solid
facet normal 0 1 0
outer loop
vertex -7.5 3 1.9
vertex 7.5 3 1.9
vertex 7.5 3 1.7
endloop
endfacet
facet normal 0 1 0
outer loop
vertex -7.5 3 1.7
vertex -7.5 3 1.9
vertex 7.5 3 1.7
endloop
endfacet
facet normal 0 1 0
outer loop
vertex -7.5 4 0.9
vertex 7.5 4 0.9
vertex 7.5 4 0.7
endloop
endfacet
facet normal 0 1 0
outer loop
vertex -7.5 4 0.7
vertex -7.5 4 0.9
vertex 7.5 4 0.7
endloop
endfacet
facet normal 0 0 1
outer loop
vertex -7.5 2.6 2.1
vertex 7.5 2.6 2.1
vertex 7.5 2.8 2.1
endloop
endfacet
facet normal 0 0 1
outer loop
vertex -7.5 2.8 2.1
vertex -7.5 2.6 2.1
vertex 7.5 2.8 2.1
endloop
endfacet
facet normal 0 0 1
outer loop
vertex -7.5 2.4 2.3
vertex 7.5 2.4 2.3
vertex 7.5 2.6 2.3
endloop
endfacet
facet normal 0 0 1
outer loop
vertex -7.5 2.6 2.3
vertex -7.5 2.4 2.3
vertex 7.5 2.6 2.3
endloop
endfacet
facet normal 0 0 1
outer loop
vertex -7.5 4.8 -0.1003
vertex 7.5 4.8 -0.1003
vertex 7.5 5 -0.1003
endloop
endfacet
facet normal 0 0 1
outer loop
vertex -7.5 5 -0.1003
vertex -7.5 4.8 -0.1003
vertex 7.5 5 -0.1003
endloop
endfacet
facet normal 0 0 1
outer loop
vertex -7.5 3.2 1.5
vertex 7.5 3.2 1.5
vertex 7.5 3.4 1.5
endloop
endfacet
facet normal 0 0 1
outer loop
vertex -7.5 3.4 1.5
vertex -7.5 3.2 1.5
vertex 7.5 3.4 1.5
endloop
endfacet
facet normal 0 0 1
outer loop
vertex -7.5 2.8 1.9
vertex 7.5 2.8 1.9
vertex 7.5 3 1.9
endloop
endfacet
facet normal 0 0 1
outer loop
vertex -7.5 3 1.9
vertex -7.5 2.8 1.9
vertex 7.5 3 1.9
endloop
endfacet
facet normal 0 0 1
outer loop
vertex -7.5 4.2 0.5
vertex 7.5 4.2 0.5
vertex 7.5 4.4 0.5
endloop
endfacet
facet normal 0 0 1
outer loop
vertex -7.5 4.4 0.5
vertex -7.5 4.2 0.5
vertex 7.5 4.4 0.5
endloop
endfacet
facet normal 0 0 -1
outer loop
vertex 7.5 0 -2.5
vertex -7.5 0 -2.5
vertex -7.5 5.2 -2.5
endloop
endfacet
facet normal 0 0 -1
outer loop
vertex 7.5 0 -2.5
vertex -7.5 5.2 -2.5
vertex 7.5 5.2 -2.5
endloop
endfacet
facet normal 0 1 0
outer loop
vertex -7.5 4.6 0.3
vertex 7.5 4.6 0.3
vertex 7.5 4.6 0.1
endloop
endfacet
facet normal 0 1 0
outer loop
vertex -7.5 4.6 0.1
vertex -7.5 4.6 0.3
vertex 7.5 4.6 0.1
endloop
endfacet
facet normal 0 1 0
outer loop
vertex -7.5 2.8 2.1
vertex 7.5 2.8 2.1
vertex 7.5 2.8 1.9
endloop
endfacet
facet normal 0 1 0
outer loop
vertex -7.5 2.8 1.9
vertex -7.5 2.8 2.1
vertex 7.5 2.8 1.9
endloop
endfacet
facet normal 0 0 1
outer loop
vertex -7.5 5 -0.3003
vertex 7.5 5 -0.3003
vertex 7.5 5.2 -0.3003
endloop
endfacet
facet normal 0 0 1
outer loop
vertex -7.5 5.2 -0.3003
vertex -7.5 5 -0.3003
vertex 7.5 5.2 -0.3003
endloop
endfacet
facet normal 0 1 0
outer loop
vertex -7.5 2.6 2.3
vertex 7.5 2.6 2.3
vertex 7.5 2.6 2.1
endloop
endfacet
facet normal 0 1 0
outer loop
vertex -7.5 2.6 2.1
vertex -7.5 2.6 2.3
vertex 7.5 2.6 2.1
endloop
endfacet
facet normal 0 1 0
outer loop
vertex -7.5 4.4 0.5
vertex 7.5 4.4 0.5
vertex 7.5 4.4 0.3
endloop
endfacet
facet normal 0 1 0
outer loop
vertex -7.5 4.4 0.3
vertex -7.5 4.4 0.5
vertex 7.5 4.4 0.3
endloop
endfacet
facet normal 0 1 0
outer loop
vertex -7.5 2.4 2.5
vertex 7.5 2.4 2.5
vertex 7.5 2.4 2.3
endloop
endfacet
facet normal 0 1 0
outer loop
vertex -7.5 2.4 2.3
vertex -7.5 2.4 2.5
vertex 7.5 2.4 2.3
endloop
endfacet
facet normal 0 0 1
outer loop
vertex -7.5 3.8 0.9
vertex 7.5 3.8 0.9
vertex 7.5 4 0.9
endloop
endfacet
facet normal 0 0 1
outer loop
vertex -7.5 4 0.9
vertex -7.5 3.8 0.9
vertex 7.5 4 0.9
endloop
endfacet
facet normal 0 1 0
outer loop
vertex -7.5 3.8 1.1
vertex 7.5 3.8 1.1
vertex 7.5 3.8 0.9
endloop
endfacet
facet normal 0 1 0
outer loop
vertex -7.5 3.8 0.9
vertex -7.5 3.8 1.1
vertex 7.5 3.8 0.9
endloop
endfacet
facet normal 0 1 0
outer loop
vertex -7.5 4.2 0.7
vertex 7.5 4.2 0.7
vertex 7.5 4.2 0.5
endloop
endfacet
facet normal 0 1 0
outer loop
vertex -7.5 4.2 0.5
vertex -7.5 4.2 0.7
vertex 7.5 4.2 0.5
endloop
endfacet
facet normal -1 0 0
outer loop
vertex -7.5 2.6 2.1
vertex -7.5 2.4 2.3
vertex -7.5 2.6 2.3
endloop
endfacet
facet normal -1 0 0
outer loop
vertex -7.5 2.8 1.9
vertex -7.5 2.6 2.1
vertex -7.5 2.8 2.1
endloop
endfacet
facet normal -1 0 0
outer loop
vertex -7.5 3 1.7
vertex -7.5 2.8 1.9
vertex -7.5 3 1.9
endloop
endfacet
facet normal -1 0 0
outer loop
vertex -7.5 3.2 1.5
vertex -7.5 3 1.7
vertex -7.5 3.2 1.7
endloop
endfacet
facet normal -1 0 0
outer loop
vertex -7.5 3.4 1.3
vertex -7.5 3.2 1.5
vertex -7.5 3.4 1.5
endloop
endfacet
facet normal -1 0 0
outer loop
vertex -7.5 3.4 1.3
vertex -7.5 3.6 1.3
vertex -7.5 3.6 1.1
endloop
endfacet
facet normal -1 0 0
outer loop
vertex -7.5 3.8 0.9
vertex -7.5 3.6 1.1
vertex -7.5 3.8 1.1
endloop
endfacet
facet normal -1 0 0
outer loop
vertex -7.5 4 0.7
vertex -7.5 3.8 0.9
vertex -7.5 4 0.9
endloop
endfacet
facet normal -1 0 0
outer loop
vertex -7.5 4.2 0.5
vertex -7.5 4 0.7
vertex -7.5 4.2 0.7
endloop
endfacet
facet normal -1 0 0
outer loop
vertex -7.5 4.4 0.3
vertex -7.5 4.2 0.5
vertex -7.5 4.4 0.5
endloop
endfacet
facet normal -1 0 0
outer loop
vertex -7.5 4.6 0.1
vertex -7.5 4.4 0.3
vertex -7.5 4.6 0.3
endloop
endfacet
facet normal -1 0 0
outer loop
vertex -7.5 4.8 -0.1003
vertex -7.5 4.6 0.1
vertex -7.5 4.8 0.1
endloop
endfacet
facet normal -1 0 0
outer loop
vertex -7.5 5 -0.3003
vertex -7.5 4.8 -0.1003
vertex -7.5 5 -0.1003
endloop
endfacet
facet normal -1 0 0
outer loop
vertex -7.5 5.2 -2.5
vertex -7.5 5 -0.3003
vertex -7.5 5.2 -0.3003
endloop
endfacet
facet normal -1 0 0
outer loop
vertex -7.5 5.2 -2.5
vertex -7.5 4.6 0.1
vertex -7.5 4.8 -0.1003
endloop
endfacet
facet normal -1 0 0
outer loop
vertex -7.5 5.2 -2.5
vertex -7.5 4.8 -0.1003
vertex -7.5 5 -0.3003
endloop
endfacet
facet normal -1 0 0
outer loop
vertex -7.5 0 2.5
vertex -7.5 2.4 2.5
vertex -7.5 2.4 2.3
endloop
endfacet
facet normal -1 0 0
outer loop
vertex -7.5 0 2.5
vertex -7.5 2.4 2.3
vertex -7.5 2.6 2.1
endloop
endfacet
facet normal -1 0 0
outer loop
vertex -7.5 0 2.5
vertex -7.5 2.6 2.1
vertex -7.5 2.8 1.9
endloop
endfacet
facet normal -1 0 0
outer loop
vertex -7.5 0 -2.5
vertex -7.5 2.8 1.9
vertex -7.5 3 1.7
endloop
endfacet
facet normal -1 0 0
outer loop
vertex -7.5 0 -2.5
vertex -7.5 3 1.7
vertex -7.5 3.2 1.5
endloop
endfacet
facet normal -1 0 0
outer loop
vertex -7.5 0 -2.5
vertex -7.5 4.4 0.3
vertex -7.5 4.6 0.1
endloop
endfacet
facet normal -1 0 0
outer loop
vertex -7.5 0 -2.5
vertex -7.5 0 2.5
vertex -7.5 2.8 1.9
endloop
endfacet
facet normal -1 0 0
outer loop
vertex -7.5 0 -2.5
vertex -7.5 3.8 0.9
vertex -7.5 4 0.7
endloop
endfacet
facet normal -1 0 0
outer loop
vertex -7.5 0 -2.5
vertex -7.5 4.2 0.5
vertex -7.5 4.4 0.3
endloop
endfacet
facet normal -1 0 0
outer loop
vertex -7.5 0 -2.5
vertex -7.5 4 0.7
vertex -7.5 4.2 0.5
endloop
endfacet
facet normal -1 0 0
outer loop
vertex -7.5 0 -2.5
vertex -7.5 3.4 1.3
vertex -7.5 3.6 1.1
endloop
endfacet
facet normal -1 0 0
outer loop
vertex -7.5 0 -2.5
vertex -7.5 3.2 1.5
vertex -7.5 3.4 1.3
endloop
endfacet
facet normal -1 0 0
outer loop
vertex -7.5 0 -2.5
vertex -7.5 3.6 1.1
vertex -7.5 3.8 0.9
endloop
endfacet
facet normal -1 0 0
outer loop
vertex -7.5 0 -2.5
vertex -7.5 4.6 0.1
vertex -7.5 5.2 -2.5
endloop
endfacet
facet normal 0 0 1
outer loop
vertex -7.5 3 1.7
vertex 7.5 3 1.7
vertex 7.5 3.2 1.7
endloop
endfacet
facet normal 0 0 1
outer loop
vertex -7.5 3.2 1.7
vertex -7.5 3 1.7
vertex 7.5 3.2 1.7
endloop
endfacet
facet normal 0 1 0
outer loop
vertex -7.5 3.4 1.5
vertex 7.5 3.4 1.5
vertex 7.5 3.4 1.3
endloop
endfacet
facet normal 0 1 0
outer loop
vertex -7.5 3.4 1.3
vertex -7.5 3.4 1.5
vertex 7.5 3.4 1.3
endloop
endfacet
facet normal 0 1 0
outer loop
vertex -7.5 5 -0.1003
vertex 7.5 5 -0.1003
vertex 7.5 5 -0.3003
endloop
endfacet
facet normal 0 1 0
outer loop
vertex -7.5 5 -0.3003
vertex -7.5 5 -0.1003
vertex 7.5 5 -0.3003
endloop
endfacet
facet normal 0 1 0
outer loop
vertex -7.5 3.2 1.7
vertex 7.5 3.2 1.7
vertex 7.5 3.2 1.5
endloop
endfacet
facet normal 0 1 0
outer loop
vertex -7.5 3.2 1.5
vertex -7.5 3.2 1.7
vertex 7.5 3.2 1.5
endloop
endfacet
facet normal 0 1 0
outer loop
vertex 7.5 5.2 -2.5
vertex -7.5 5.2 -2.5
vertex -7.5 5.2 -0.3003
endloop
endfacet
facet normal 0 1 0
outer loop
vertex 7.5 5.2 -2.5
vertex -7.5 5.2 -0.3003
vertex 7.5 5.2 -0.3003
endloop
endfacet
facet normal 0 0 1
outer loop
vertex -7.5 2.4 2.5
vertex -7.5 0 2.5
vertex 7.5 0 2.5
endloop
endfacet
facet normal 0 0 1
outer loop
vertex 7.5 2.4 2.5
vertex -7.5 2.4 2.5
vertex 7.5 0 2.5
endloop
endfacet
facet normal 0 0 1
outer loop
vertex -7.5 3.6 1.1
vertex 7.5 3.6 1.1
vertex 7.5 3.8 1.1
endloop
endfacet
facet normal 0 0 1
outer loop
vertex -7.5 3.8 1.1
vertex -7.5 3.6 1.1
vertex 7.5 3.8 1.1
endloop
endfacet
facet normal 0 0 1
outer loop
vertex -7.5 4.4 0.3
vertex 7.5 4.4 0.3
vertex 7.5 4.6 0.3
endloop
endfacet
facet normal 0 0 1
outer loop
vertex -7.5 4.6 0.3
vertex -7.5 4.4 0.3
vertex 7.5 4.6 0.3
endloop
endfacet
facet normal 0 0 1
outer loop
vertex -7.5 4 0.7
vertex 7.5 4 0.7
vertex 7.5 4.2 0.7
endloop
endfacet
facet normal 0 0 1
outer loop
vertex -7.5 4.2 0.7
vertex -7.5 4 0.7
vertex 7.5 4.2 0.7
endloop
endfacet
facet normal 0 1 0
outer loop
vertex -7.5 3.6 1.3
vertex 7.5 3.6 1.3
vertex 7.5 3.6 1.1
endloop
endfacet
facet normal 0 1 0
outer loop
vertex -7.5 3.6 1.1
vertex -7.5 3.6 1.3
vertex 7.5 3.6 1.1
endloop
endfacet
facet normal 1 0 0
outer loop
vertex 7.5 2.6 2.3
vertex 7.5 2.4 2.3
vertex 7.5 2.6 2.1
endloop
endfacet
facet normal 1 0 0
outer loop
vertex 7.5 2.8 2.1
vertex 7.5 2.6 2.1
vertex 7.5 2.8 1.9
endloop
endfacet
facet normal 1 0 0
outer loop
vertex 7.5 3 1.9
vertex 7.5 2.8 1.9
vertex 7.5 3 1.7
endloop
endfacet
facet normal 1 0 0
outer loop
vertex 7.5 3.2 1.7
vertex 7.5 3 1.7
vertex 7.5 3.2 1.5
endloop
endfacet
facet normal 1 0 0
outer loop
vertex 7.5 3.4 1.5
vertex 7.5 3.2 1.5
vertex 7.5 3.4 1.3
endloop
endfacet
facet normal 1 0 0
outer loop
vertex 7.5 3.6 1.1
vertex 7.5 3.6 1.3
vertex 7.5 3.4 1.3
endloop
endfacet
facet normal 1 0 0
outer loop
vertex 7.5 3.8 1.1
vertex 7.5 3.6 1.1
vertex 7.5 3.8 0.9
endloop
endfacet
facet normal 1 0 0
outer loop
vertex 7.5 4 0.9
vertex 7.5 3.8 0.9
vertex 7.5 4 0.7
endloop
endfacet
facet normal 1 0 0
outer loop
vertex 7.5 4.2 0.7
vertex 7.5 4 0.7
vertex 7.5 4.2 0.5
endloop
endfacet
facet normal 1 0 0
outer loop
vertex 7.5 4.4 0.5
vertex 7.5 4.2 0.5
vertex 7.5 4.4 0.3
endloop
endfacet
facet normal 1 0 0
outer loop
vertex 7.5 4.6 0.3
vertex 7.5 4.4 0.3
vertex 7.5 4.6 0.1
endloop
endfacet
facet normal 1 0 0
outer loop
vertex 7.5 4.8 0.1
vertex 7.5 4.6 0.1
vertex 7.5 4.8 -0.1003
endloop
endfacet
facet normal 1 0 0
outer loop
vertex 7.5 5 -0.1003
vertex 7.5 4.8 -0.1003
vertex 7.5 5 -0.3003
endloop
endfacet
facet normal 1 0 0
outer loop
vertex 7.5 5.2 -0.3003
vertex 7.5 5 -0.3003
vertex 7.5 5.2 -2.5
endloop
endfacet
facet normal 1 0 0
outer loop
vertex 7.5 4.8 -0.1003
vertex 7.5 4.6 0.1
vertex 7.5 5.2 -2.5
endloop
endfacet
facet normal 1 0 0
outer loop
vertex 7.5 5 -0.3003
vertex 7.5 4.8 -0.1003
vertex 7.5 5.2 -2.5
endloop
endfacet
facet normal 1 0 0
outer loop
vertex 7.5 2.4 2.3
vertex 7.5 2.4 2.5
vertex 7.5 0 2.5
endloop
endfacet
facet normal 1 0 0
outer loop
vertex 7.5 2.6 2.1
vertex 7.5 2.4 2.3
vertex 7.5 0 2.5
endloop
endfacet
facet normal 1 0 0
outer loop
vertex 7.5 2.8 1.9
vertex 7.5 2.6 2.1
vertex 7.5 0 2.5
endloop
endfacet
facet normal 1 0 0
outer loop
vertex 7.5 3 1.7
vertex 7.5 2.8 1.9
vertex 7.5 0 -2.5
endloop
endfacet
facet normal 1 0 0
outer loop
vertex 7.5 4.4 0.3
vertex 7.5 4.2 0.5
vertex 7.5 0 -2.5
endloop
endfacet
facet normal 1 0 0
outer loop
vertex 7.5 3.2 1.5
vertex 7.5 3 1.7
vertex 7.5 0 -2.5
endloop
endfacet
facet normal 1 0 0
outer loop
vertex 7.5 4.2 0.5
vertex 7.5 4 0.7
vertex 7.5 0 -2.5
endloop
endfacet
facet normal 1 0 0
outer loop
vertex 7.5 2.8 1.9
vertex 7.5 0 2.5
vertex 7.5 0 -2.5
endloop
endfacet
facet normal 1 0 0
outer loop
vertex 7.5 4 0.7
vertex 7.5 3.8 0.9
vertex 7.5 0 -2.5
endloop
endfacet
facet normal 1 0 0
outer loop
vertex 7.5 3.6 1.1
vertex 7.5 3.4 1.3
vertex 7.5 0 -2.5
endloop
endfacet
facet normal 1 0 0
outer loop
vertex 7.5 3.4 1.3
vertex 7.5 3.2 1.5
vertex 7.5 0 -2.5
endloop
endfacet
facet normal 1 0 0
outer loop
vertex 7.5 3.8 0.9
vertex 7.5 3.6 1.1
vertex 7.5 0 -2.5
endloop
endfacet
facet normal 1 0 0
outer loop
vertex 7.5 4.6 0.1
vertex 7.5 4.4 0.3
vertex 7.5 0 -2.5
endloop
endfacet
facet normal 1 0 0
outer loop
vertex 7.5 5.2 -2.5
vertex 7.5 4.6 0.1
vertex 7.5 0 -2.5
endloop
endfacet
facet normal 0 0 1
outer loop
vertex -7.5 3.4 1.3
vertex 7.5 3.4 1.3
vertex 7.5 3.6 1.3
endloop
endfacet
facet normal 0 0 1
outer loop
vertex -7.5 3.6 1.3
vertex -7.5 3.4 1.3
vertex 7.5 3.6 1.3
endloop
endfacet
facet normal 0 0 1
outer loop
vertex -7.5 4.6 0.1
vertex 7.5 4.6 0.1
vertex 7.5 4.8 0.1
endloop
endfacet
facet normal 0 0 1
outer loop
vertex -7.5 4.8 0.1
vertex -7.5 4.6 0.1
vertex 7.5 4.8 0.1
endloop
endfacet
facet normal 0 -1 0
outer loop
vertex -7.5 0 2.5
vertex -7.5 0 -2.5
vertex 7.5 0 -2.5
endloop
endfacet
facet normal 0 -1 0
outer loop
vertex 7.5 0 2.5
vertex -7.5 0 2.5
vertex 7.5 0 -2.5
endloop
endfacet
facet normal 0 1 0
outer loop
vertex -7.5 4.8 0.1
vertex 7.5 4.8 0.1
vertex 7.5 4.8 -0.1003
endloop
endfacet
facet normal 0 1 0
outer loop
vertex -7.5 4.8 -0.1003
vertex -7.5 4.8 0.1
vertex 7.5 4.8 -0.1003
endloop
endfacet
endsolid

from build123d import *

# Parameters (mm, degrees)
SKETCH_1_W          = 15
SKETCH_1_H          = 5
EXTRUDE_1_DEPTH     = 5.2
CUT_EXTRUDE_1_DEPTH = 17.071403175


with BuildPart() as part:
    # 草图1 → 凸台-拉伸1 (new body)
    with BuildSketch(Plane(origin=(0, 0, 0), x_dir=(1, 0, 0), z_dir=(0, 1, 0))):
        Rectangle(SKETCH_1_W, SKETCH_1_H)
    extrude(amount=EXTRUDE_1_DEPTH)

    # 草图6 → 切除-拉伸1 (cut, through all)
    with BuildSketch(Plane(origin=(7.5, 0, 0), x_dir=(0, 0, -1), z_dir=(1, 0, 0))):
        Polygon((-2.5, 2.4), (-2.3, 2.4), (-2.3, 2.6), (-2.1, 2.6), (-2.1, 2.8), (-1.9, 2.8), (-1.9, 3), (-1.7, 3), (-1.7, 3.2), (-1.5, 3.2), (-1.5, 3.4), (-1.3, 3.4), (-1.3, 3.6), (-1.1, 3.6), (-1.1, 3.8), (-0.9, 3.8), (-0.9, 4), (-0.7, 4), (-0.7, 4.2), (-0.5, 4.2), (-0.5, 4.4), (-0.3, 4.4), (-0.3, 4.6), (-0.1, 4.6), (-0.1, 4.8), (0.100331193, 4.8), (0.100331193, 5), (0.300331193, 5), (0.300331193, 5.2), (-2.5, 5.2), align=None)
    extrude(amount=-CUT_EXTRUDE_1_DEPTH, mode=Mode.SUBTRACT)


solid = part.part
